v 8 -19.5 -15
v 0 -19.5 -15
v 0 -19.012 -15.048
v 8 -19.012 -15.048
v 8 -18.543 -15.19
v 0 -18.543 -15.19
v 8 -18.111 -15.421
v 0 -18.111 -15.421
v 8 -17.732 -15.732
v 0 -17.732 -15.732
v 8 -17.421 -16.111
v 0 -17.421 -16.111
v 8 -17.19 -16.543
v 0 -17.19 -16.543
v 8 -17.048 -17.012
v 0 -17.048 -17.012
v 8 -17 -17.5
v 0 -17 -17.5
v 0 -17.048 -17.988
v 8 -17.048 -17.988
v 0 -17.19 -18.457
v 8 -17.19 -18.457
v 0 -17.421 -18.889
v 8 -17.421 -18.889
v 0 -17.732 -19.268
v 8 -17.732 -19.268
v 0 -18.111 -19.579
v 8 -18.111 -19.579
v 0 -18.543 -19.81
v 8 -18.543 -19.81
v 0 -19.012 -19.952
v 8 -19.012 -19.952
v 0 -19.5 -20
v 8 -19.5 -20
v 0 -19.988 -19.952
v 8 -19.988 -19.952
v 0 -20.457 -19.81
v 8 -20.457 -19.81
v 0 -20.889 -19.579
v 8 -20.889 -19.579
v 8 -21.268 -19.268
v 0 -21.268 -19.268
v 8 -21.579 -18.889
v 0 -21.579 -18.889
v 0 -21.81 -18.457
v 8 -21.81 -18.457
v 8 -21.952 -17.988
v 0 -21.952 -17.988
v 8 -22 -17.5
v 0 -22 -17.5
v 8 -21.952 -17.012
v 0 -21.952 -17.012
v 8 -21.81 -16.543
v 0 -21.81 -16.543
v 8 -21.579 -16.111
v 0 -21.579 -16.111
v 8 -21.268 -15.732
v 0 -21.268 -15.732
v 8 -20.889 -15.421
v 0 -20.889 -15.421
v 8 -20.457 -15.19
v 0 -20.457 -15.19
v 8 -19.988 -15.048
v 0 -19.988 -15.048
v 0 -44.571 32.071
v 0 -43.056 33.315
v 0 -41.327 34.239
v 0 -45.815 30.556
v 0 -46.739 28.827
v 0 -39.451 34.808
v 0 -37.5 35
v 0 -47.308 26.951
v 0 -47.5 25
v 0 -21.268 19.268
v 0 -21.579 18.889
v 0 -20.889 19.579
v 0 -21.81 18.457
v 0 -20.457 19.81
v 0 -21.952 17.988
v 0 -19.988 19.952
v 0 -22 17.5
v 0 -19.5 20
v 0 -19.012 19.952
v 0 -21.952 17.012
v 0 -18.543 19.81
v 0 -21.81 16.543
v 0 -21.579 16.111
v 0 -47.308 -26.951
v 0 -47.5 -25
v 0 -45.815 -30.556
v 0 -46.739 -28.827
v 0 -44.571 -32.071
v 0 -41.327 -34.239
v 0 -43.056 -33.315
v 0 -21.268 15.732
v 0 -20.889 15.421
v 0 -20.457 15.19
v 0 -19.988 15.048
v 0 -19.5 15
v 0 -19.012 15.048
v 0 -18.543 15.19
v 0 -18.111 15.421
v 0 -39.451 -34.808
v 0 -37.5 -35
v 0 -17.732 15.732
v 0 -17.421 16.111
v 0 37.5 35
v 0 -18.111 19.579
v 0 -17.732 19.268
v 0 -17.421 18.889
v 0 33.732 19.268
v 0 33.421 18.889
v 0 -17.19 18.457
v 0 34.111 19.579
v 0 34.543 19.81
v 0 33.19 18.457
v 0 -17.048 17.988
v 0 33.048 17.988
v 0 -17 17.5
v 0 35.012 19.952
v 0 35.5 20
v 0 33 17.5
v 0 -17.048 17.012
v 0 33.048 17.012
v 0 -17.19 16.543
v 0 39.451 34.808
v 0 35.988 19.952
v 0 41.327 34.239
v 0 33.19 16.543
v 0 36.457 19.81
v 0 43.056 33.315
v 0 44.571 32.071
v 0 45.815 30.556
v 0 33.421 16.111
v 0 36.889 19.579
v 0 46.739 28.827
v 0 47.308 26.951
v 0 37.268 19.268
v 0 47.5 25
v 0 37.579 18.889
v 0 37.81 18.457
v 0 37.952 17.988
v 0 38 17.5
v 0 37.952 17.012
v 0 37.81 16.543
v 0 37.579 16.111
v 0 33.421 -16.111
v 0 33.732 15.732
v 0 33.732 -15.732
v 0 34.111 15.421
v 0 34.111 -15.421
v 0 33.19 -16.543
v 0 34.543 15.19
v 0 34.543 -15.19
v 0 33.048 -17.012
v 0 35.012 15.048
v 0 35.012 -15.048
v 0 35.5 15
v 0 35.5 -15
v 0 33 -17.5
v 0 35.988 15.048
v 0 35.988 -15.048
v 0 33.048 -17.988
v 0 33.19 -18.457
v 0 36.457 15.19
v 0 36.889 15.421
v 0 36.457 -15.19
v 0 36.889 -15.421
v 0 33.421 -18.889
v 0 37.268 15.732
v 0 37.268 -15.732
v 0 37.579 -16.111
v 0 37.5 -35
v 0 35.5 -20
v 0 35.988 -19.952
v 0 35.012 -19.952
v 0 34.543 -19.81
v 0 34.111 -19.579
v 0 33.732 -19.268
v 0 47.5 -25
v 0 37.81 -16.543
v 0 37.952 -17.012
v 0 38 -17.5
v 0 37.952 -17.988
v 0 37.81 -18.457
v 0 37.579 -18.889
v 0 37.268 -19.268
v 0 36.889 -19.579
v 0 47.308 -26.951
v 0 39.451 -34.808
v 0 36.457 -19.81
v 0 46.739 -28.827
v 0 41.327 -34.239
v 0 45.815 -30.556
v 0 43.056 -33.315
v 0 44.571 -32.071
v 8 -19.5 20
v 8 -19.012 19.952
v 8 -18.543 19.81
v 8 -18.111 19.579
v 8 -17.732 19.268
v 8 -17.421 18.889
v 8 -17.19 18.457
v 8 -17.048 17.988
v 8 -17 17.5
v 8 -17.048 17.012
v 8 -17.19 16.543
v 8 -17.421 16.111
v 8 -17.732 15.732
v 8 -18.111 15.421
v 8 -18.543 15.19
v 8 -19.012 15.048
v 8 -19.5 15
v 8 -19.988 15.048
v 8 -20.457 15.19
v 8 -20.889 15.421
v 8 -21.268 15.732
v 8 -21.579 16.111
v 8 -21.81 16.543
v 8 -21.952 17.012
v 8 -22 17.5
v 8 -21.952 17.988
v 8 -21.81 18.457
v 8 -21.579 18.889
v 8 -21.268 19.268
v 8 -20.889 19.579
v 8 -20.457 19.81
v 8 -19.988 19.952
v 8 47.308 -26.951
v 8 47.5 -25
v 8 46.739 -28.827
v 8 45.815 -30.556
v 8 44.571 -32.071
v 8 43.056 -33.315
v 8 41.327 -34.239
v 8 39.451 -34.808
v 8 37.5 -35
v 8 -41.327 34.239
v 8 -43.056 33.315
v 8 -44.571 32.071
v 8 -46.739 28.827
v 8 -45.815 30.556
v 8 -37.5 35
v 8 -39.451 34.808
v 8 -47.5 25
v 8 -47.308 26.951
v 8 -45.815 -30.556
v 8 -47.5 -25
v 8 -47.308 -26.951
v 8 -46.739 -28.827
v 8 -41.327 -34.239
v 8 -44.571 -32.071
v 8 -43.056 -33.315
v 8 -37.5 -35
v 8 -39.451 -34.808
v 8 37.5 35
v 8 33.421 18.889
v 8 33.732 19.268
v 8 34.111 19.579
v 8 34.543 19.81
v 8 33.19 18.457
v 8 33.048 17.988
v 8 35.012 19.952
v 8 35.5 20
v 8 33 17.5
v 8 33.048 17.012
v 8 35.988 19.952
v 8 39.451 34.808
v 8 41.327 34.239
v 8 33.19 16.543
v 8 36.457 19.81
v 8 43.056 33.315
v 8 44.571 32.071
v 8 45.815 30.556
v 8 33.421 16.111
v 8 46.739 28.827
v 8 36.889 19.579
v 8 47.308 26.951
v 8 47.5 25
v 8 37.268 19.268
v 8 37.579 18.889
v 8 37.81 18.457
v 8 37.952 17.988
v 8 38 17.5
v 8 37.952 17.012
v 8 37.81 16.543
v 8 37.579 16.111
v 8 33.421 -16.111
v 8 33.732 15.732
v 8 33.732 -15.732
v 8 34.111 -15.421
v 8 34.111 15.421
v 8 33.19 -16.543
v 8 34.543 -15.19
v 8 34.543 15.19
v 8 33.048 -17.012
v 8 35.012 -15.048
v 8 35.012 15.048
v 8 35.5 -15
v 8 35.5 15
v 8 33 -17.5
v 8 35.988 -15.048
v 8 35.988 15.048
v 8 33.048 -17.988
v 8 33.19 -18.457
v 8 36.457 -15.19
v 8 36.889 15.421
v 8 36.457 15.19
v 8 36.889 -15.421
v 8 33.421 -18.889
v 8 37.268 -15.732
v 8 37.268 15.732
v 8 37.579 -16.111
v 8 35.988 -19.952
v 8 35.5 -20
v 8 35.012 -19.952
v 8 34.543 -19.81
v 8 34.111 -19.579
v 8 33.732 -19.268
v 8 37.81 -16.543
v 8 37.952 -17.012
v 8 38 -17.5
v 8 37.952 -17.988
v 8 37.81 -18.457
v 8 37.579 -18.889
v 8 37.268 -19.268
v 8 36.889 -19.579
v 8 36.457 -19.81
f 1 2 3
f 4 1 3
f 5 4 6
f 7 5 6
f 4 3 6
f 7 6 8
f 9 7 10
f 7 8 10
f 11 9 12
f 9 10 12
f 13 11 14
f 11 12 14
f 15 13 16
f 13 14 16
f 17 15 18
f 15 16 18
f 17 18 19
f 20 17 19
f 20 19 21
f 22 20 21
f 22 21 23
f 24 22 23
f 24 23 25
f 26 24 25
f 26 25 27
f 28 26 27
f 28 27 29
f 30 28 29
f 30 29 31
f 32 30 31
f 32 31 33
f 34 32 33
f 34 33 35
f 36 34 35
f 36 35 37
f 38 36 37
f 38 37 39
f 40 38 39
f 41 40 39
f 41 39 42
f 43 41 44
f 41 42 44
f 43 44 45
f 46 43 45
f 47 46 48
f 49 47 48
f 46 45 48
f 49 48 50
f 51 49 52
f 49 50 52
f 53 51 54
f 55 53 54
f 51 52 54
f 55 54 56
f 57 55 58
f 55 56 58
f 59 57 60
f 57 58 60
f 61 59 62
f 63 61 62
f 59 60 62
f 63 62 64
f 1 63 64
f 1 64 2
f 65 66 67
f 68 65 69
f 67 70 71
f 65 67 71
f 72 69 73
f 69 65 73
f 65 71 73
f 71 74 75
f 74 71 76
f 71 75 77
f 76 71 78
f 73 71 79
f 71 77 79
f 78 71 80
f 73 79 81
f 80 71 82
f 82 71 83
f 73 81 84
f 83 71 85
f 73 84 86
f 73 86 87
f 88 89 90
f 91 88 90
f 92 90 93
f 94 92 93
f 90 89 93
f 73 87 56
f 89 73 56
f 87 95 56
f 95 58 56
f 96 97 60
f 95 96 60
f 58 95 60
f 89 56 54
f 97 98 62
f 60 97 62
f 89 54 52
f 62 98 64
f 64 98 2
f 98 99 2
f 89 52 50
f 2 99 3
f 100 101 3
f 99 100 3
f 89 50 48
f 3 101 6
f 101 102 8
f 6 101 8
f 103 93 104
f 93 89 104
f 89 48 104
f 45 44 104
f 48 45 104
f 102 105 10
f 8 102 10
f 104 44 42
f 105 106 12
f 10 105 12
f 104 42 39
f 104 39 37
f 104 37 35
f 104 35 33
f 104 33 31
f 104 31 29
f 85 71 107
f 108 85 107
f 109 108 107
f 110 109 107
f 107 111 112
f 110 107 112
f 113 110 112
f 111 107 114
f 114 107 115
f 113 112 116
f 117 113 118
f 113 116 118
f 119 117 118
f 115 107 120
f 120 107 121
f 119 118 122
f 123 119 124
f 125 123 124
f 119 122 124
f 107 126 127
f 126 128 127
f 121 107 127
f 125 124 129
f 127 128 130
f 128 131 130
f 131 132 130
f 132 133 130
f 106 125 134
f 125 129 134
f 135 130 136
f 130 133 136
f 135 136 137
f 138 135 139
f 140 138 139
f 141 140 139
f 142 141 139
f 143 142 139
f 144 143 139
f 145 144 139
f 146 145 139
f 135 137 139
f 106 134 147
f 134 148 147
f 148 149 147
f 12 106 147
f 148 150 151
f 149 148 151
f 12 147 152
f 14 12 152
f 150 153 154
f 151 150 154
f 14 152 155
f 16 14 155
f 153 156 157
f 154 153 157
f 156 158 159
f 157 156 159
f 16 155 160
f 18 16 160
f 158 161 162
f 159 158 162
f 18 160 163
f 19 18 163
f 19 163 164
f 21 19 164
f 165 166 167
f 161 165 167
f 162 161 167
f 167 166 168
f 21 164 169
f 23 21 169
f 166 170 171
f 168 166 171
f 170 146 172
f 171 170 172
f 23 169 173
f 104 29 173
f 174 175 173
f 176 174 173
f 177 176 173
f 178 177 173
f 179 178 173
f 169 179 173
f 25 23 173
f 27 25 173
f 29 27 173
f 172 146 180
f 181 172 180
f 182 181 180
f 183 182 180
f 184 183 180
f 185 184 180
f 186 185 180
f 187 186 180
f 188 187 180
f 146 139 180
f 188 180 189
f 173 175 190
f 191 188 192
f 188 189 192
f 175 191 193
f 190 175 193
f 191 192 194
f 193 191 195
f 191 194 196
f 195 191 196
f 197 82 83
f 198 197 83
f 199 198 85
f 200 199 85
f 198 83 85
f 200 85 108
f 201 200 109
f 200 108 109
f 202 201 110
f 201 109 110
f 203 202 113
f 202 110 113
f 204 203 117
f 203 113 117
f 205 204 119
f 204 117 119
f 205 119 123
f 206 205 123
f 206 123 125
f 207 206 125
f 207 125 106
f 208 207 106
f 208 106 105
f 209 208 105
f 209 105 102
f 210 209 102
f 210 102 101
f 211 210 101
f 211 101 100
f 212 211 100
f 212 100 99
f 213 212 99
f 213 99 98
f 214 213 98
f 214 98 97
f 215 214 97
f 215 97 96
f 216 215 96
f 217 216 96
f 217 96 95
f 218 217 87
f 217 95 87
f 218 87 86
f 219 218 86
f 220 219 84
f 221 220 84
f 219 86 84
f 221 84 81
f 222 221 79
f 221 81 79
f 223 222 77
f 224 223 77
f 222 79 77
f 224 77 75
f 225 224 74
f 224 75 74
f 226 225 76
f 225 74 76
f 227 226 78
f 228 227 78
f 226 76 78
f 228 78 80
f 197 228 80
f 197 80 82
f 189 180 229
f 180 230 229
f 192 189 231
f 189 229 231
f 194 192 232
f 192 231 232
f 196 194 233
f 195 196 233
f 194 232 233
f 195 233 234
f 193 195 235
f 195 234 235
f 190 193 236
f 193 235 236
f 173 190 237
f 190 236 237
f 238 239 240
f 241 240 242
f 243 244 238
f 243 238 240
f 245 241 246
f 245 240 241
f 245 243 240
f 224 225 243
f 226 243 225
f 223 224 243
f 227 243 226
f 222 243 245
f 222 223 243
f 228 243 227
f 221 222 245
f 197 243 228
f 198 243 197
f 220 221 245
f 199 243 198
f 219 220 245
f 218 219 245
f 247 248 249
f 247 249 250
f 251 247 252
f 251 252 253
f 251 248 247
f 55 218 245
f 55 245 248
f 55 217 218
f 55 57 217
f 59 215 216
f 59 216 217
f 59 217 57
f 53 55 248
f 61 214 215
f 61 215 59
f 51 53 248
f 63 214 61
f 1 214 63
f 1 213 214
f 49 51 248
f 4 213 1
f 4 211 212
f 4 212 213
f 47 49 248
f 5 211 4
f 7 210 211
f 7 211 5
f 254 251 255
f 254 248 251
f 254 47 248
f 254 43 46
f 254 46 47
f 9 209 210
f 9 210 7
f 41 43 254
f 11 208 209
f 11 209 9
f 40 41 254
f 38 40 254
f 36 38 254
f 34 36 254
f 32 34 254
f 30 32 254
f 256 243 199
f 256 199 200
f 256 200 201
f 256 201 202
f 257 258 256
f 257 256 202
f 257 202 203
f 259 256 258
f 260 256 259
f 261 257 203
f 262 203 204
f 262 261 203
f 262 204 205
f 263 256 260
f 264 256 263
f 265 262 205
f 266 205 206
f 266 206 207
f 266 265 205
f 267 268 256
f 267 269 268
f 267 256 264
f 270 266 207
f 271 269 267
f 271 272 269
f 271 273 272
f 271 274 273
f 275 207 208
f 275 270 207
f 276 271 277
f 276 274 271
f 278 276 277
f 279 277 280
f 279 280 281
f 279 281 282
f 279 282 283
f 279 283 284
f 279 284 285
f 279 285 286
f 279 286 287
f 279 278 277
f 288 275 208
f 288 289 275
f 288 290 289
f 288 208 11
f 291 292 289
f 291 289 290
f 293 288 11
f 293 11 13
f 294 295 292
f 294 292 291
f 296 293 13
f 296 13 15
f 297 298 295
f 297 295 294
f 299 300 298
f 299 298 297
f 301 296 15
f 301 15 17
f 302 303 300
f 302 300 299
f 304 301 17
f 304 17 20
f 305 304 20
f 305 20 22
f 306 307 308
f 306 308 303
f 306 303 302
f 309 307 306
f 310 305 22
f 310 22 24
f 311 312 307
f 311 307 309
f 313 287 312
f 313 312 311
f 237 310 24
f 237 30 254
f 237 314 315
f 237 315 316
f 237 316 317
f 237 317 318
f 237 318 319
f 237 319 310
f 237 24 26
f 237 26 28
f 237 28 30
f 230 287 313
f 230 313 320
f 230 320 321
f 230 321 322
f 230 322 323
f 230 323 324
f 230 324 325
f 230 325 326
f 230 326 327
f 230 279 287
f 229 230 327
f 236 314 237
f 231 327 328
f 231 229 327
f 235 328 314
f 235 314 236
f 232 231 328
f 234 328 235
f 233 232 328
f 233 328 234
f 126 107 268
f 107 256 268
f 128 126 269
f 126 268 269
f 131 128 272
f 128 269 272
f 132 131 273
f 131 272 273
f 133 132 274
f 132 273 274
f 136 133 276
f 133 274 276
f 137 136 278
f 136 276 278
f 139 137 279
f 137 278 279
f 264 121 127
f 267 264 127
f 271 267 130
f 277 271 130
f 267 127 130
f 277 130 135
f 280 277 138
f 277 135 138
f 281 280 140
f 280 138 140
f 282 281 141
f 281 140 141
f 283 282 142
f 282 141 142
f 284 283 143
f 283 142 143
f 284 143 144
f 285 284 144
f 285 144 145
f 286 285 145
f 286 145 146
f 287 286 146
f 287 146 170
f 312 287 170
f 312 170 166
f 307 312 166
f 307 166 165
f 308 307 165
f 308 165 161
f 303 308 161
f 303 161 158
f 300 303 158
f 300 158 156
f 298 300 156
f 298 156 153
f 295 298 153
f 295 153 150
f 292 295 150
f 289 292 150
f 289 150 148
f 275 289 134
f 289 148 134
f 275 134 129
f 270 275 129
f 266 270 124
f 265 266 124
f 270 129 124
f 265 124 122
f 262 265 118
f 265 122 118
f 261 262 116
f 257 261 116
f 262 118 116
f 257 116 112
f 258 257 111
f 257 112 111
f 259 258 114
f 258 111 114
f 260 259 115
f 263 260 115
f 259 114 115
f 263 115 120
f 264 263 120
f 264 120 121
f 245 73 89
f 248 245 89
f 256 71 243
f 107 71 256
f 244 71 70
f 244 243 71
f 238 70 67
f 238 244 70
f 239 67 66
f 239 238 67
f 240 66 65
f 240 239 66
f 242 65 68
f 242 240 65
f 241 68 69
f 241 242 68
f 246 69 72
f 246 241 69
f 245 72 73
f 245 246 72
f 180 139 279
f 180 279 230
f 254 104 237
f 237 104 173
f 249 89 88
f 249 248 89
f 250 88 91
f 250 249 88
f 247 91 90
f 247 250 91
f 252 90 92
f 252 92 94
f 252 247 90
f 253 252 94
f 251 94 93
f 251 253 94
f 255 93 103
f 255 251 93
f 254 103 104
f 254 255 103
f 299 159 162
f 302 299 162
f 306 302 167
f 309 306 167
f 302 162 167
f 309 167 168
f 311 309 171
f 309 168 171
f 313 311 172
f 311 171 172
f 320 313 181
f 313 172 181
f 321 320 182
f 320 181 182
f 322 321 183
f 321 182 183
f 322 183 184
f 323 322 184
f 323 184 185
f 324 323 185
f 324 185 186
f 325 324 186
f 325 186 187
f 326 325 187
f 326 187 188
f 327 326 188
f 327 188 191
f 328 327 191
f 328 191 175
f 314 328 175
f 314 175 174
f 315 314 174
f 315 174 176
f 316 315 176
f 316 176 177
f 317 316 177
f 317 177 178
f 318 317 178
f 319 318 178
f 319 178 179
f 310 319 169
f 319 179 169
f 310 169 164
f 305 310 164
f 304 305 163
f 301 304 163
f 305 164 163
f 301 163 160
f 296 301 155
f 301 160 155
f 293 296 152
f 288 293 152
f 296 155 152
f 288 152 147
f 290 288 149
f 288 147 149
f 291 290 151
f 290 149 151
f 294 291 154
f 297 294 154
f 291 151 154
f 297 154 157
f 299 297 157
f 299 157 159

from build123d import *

# Parameters (mm, degrees)
SKETCH_1_W             = 70
SKETCH_1_H             = 95
EXTRUDE_1_DEPTH        = 8
HOLE_WIZARD_M6_1_D     = 5
HOLE_WIZARD_M6_1_DEPTH = 17
HOLE_WIZARD_M6_1_TIP   = 1.502151548
FILLET_1_R             = 10


with BuildPart() as part:
    # 草图1 → 凸台-拉伸1 (new body)
    with BuildSketch(Plane(origin=(0, 0, 0), x_dir=(0, 0, -1), z_dir=(1, 0, 0))):
        Rectangle(SKETCH_1_W, SKETCH_1_H)
    extrude(amount=EXTRUDE_1_DEPTH)

    # M6 螺纹孔1
    with Locations(Plane(origin=(8, 0, 0), x_dir=(0, 0, -1), z_dir=(1, 0, 0))):
        with Locations((-17.5, 35.5), (17.5, 35.5), (-17.5, -19.5), (17.5, -19.5)):
            Hole(HOLE_WIZARD_M6_1_D / 2, depth=HOLE_WIZARD_M6_1_DEPTH)
            with Locations((0, 0, -(HOLE_WIZARD_M6_1_DEPTH + HOLE_WIZARD_M6_1_TIP / 2))):  # 118° drill point
                Cone(0, HOLE_WIZARD_M6_1_D / 2, HOLE_WIZARD_M6_1_TIP, mode=Mode.SUBTRACT)

    # 圆角1
    fillet_1_edges = [part.edges().sort_by_distance(p)[0] for p in [
        (4, 47.5, 35),
        (4, 47.5, -35),
        (4, -47.5, -35),
        (4, -47.5, 35),
    ]]
    fillet(fillet_1_edges, radius=FILLET_1_R)


solid = part.part
